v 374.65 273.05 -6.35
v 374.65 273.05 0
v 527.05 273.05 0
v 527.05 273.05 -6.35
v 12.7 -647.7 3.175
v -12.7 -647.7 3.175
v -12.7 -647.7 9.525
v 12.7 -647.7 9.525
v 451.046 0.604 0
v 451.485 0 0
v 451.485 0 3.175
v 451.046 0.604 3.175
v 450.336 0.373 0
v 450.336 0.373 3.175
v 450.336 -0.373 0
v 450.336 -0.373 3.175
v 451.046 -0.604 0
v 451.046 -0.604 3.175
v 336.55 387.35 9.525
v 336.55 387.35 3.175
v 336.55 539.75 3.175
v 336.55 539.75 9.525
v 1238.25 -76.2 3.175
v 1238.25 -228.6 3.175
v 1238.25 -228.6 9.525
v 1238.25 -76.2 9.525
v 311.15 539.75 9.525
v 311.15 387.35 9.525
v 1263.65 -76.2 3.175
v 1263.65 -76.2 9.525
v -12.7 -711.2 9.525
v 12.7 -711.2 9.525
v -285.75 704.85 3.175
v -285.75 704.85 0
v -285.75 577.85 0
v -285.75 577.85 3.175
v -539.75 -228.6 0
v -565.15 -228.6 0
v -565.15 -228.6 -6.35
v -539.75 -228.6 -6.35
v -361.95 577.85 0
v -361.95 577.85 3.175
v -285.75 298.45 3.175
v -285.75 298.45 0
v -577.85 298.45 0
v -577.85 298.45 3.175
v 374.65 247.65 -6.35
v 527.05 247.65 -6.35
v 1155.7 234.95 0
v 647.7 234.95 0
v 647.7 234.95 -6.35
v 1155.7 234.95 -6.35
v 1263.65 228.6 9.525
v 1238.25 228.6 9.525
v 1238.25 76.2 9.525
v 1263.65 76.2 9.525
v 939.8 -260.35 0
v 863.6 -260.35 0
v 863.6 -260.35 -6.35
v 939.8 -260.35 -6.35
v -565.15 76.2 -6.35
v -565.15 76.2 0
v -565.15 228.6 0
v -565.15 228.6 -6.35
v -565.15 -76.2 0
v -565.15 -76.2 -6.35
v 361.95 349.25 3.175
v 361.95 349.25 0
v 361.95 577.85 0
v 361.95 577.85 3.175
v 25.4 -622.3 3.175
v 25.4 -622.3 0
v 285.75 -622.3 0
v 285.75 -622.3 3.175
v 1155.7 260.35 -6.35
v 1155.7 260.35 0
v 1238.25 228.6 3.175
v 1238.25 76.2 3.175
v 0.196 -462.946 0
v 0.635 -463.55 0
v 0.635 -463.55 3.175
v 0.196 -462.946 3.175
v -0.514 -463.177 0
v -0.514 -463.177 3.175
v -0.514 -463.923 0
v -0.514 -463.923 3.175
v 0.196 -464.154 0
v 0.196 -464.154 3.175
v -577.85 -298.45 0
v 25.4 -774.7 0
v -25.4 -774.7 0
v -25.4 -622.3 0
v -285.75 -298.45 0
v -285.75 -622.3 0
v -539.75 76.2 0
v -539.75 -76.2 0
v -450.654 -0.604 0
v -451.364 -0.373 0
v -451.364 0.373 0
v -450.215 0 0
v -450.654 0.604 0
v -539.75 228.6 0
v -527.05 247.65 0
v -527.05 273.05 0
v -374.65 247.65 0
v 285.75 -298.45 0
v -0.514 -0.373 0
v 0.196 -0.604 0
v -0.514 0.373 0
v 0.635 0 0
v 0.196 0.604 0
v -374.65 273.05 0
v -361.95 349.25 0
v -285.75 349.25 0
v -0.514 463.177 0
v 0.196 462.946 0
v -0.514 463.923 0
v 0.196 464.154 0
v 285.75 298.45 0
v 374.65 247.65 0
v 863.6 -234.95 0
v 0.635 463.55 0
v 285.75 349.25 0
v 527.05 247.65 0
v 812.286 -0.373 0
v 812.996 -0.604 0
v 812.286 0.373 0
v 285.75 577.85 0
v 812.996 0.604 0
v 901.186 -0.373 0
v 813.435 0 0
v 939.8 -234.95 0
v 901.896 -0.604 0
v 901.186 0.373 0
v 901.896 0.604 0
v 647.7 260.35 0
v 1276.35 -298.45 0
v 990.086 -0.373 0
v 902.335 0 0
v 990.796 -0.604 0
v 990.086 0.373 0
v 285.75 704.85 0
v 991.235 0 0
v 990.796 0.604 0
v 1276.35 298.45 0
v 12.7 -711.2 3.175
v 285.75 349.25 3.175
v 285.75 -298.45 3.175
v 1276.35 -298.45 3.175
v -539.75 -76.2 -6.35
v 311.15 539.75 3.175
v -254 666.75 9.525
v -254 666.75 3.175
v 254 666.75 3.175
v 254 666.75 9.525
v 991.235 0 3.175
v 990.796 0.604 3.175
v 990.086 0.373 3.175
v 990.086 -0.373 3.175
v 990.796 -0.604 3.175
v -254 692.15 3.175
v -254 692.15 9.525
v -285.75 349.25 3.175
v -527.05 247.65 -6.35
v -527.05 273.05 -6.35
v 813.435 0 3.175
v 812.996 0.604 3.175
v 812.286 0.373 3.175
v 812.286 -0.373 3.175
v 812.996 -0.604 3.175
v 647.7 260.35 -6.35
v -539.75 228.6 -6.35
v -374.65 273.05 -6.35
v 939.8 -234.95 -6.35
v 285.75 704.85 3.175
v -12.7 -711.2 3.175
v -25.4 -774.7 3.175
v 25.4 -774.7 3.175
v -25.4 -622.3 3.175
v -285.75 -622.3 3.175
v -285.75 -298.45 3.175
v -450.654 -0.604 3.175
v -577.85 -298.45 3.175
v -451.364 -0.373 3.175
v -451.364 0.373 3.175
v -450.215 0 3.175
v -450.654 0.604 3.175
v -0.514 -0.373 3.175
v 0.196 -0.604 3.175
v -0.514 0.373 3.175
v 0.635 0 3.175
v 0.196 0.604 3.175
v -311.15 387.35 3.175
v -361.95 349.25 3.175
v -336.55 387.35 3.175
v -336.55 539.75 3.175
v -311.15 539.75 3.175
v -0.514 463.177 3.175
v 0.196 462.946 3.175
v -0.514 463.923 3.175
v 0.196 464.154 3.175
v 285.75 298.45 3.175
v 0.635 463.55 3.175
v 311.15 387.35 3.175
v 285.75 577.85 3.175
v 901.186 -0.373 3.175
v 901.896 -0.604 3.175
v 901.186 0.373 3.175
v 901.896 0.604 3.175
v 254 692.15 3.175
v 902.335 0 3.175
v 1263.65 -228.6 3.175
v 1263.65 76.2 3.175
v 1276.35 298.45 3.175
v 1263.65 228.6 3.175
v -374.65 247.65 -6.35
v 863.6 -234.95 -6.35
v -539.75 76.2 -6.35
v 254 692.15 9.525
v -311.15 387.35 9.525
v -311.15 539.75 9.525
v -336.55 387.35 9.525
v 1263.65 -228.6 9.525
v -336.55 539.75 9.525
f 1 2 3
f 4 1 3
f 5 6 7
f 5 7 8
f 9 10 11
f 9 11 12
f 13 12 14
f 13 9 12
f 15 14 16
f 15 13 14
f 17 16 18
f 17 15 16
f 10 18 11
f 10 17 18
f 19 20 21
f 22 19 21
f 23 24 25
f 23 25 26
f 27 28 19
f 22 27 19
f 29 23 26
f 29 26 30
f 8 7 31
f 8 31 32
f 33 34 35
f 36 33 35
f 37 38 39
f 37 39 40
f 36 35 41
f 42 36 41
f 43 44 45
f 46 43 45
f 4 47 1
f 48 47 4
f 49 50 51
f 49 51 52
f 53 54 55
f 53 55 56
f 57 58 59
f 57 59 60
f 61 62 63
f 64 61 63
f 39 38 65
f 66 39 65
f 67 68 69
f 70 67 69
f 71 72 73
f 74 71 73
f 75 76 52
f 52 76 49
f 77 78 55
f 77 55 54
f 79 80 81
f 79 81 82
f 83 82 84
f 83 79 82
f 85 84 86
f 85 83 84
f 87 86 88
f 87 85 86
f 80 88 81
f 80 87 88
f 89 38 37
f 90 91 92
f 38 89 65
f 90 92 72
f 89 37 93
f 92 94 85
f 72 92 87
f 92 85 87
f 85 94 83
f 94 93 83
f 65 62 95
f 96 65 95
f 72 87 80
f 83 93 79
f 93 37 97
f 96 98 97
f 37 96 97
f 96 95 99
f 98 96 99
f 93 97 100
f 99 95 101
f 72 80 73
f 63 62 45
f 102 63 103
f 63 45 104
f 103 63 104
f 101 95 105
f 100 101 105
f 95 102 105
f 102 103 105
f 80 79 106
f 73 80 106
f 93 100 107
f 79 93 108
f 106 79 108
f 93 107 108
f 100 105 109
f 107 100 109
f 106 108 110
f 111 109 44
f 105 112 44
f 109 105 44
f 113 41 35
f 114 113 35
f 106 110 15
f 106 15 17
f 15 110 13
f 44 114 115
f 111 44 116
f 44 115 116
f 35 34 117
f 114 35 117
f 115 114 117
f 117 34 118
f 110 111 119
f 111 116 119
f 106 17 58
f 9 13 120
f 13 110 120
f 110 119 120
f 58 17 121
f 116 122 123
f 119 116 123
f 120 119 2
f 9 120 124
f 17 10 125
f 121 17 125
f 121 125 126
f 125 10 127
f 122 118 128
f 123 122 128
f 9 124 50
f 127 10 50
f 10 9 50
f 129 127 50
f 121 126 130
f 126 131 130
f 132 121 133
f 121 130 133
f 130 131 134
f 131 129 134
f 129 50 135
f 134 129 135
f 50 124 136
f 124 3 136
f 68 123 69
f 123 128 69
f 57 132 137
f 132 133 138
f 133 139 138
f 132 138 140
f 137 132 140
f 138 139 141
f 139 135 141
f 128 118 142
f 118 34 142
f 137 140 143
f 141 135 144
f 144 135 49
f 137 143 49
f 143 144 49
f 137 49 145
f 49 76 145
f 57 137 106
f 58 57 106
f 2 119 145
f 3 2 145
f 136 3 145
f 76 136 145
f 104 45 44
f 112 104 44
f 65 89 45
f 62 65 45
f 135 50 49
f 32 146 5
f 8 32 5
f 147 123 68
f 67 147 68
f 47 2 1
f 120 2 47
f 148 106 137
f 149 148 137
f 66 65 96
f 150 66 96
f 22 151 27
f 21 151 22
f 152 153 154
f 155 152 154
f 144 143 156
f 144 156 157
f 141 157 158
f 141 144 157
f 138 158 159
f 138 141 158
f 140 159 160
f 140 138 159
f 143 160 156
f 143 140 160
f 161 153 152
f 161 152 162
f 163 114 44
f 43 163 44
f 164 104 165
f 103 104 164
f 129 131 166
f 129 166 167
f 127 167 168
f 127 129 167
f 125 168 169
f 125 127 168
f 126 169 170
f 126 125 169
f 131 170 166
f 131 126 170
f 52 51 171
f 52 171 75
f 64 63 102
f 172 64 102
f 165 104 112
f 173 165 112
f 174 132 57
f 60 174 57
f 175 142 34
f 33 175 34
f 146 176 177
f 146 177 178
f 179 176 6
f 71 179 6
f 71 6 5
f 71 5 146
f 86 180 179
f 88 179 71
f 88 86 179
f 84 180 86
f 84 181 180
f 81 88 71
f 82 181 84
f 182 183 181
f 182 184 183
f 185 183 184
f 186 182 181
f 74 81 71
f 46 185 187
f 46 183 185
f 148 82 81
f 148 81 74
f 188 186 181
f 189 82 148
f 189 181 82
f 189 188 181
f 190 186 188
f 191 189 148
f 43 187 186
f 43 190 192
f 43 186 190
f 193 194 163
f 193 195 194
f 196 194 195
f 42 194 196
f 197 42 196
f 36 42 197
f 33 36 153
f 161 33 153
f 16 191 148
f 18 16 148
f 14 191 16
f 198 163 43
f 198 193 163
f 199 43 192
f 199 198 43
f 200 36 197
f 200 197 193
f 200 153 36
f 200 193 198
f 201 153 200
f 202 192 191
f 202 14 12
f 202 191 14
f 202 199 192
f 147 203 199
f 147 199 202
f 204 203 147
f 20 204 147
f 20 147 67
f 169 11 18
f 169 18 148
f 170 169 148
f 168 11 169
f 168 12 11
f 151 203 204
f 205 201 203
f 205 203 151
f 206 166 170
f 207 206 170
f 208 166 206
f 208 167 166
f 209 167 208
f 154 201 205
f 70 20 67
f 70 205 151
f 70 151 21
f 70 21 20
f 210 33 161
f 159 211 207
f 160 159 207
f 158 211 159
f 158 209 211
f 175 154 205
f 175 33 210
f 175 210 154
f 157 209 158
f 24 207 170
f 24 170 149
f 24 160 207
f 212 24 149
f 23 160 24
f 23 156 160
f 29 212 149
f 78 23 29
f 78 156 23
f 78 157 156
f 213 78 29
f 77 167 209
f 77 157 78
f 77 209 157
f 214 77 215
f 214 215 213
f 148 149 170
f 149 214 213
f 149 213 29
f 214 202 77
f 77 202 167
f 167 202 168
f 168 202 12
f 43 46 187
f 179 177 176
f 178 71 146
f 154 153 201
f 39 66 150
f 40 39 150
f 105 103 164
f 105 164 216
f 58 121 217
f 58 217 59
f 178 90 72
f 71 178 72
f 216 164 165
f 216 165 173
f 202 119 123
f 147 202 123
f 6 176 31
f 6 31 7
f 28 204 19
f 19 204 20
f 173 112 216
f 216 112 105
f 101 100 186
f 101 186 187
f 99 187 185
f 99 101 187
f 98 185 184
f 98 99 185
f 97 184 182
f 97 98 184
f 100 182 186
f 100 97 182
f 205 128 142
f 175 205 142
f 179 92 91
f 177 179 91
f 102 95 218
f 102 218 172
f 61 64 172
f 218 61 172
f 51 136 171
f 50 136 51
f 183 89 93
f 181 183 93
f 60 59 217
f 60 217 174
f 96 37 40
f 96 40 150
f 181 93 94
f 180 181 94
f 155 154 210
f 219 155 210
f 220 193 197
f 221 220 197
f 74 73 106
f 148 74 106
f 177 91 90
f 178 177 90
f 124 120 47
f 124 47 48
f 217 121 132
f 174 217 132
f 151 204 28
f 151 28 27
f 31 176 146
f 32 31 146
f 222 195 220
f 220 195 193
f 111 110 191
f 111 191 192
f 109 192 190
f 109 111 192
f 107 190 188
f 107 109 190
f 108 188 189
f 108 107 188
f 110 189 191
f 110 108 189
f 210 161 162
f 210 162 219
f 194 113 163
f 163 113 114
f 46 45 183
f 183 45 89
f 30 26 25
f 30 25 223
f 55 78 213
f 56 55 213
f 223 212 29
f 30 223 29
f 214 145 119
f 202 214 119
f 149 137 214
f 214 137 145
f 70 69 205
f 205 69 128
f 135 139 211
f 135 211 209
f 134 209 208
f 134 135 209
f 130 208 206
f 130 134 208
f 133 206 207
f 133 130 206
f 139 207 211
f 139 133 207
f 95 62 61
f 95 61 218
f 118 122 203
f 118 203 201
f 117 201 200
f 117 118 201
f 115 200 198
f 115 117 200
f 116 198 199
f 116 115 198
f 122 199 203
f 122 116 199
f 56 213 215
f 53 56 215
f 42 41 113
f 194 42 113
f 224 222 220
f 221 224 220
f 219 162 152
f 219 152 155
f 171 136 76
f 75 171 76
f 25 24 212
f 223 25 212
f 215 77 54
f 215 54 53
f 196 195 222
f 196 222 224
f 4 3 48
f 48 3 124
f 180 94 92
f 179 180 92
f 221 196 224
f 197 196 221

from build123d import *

# Parameters (mm, degrees)
F0_R      = 0.635
F1_DEPTH  = 3.175
F2_W      = 508
F2_H      = 25.4
F3_DEPTH  = 6.35
F4_W      = 25.4
F4_H      = 63.5
F4_H_2    = 152.4
F5_DEPTH  = 6.35
F6_W      = 508
F6_H      = 25.4
F7_DEPTH  = 6.35
F8_W      = 152.4
F8_H      = 25.4
F9_DEPTH  = 6.35
F10_W     = 25.4
F10_H     = 152.4
F11_DEPTH = 6.35
F12_W     = 25.4
F12_H     = 152.4
F13_DEPTH = 6.35
F14_W     = 76.2
F14_H     = 25.4
F15_DEPTH = 6.35


# Not quite as in the source:
# - a feature of the source that left no trace in its solid (it failed there, or was rolled back) is left out


with BuildPart() as f1:
    # F0 (on Top) → F1 (new body)
    with BuildSketch(Plane.XY):
        Polygon((285.75, -298.45), (323.85, -298.45), (577.85, -298.45), (615.95, -298.45), (1187.45, -298.45), (1276.35, -298.45), (1276.35, 298.45), (1187.45, 298.45), (285.75, 298.45), (285.75, 349.25), (361.95, 349.25), (361.95, 577.85), (285.75, 577.85), (285.75, 704.85), (-285.75, 704.85), (-285.75, 577.85), (-361.95, 577.85), (-361.95, 349.25), (-285.75, 349.25), (-285.75, 336.55), (-285.75, 298.45), (-323.85, 298.45), (-361.95, 298.45), (-577.85, 298.45), (-577.85, -298.45), (-323.85, -298.45), (-285.75, -298.45), (-285.75, -336.55), (-285.75, -622.3), (-25.4, -622.3), (-25.4, -774.7), (25.4, -774.7), (25.4, -622.3), (177.8, -622.3), (285.75, -622.3), (285.75, -336.55), align=None)
        with Locations((0, -463.55)):
            Circle(F0_R, mode=Mode.SUBTRACT)
        with Locations((-450.85, 0)):
            Circle(F0_R, mode=Mode.SUBTRACT)
        Circle(F0_R, mode=Mode.SUBTRACT)
        with Locations((0, 463.55)):
            Circle(F0_R, mode=Mode.SUBTRACT)
        with Locations((450.85, 0)):
            Circle(F0_R, mode=Mode.SUBTRACT)
        with Locations((812.8, 0)):
            Circle(F0_R, mode=Mode.SUBTRACT)
        with Locations((901.7, 0)):
            Circle(F0_R, mode=Mode.SUBTRACT)
        with Locations((990.6, 0)):
            Circle(F0_R, mode=Mode.SUBTRACT)
    extrude(amount=F1_DEPTH)

    # F2 (on face) → F3 (join)
    with BuildSketch(Plane.XY.offset(3.175)):
        with Locations((0, 679.45)):
            Rectangle(F2_W, F2_H)
    extrude(amount=F3_DEPTH)

    # F4 (on face) → F5 (join)
    with BuildSketch(Plane.XY.offset(3.175)):
        with Locations((0, -679.45)):
            Rectangle(F4_W, F4_H)
        with Locations((-323.85, 463.55)):
            Rectangle(F4_W, F4_H_2)
        with Locations((323.85, 463.55)):
            Rectangle(F4_W, F4_H_2)
    extrude(amount=F5_DEPTH)

    # F6 (on face) → F7 (join)
    with BuildSketch(Plane(origin=(0, 0, 0), x_dir=(1, 0, 0), z_dir=(0, 0, -1))):
        with Locations((901.7, -247.65)):
            Rectangle(F6_W, F6_H)
    extrude(amount=F7_DEPTH)

    # F8 (on face) → F9 (join)
    with BuildSketch(Plane(origin=(0, 0, 0), x_dir=(1, 0, 0), z_dir=(0, 0, -1))):
        with Locations((450.85, -260.35)):
            Rectangle(F8_W, F8_H)
        with Locations((-450.85, -260.35)):
            Rectangle(F8_W, F8_H)
    extrude(amount=F9_DEPTH)

    # F10 (on face) → F11 (join)
    with BuildSketch(Plane.XY.offset(3.175)):
        with Locations((1250.95, 152.4)):
            Rectangle(F10_W, F10_H)
        with Locations((1250.95, -152.4)):
            Rectangle(F10_W, F10_H)
    extrude(amount=F11_DEPTH)

    # F12 (on face) → F13 (join)
    with BuildSketch(Plane.XY):
        with Locations((-552.45, 152.4)):
            Rectangle(F12_W, F12_H)
        with Locations((-552.45, -152.4)):
            Rectangle(F12_W, F12_H)
    extrude(amount=-F13_DEPTH)

    # F14 (on face) → F15 (join)
    with BuildSketch(Plane(origin=(0, 0, 0), x_dir=(1, 0, 0), z_dir=(0, 0, -1))):
        with Locations((901.7, 247.65)):
            Rectangle(F14_W, F14_H)
    extrude(amount=F15_DEPTH)


solid = f1.part
